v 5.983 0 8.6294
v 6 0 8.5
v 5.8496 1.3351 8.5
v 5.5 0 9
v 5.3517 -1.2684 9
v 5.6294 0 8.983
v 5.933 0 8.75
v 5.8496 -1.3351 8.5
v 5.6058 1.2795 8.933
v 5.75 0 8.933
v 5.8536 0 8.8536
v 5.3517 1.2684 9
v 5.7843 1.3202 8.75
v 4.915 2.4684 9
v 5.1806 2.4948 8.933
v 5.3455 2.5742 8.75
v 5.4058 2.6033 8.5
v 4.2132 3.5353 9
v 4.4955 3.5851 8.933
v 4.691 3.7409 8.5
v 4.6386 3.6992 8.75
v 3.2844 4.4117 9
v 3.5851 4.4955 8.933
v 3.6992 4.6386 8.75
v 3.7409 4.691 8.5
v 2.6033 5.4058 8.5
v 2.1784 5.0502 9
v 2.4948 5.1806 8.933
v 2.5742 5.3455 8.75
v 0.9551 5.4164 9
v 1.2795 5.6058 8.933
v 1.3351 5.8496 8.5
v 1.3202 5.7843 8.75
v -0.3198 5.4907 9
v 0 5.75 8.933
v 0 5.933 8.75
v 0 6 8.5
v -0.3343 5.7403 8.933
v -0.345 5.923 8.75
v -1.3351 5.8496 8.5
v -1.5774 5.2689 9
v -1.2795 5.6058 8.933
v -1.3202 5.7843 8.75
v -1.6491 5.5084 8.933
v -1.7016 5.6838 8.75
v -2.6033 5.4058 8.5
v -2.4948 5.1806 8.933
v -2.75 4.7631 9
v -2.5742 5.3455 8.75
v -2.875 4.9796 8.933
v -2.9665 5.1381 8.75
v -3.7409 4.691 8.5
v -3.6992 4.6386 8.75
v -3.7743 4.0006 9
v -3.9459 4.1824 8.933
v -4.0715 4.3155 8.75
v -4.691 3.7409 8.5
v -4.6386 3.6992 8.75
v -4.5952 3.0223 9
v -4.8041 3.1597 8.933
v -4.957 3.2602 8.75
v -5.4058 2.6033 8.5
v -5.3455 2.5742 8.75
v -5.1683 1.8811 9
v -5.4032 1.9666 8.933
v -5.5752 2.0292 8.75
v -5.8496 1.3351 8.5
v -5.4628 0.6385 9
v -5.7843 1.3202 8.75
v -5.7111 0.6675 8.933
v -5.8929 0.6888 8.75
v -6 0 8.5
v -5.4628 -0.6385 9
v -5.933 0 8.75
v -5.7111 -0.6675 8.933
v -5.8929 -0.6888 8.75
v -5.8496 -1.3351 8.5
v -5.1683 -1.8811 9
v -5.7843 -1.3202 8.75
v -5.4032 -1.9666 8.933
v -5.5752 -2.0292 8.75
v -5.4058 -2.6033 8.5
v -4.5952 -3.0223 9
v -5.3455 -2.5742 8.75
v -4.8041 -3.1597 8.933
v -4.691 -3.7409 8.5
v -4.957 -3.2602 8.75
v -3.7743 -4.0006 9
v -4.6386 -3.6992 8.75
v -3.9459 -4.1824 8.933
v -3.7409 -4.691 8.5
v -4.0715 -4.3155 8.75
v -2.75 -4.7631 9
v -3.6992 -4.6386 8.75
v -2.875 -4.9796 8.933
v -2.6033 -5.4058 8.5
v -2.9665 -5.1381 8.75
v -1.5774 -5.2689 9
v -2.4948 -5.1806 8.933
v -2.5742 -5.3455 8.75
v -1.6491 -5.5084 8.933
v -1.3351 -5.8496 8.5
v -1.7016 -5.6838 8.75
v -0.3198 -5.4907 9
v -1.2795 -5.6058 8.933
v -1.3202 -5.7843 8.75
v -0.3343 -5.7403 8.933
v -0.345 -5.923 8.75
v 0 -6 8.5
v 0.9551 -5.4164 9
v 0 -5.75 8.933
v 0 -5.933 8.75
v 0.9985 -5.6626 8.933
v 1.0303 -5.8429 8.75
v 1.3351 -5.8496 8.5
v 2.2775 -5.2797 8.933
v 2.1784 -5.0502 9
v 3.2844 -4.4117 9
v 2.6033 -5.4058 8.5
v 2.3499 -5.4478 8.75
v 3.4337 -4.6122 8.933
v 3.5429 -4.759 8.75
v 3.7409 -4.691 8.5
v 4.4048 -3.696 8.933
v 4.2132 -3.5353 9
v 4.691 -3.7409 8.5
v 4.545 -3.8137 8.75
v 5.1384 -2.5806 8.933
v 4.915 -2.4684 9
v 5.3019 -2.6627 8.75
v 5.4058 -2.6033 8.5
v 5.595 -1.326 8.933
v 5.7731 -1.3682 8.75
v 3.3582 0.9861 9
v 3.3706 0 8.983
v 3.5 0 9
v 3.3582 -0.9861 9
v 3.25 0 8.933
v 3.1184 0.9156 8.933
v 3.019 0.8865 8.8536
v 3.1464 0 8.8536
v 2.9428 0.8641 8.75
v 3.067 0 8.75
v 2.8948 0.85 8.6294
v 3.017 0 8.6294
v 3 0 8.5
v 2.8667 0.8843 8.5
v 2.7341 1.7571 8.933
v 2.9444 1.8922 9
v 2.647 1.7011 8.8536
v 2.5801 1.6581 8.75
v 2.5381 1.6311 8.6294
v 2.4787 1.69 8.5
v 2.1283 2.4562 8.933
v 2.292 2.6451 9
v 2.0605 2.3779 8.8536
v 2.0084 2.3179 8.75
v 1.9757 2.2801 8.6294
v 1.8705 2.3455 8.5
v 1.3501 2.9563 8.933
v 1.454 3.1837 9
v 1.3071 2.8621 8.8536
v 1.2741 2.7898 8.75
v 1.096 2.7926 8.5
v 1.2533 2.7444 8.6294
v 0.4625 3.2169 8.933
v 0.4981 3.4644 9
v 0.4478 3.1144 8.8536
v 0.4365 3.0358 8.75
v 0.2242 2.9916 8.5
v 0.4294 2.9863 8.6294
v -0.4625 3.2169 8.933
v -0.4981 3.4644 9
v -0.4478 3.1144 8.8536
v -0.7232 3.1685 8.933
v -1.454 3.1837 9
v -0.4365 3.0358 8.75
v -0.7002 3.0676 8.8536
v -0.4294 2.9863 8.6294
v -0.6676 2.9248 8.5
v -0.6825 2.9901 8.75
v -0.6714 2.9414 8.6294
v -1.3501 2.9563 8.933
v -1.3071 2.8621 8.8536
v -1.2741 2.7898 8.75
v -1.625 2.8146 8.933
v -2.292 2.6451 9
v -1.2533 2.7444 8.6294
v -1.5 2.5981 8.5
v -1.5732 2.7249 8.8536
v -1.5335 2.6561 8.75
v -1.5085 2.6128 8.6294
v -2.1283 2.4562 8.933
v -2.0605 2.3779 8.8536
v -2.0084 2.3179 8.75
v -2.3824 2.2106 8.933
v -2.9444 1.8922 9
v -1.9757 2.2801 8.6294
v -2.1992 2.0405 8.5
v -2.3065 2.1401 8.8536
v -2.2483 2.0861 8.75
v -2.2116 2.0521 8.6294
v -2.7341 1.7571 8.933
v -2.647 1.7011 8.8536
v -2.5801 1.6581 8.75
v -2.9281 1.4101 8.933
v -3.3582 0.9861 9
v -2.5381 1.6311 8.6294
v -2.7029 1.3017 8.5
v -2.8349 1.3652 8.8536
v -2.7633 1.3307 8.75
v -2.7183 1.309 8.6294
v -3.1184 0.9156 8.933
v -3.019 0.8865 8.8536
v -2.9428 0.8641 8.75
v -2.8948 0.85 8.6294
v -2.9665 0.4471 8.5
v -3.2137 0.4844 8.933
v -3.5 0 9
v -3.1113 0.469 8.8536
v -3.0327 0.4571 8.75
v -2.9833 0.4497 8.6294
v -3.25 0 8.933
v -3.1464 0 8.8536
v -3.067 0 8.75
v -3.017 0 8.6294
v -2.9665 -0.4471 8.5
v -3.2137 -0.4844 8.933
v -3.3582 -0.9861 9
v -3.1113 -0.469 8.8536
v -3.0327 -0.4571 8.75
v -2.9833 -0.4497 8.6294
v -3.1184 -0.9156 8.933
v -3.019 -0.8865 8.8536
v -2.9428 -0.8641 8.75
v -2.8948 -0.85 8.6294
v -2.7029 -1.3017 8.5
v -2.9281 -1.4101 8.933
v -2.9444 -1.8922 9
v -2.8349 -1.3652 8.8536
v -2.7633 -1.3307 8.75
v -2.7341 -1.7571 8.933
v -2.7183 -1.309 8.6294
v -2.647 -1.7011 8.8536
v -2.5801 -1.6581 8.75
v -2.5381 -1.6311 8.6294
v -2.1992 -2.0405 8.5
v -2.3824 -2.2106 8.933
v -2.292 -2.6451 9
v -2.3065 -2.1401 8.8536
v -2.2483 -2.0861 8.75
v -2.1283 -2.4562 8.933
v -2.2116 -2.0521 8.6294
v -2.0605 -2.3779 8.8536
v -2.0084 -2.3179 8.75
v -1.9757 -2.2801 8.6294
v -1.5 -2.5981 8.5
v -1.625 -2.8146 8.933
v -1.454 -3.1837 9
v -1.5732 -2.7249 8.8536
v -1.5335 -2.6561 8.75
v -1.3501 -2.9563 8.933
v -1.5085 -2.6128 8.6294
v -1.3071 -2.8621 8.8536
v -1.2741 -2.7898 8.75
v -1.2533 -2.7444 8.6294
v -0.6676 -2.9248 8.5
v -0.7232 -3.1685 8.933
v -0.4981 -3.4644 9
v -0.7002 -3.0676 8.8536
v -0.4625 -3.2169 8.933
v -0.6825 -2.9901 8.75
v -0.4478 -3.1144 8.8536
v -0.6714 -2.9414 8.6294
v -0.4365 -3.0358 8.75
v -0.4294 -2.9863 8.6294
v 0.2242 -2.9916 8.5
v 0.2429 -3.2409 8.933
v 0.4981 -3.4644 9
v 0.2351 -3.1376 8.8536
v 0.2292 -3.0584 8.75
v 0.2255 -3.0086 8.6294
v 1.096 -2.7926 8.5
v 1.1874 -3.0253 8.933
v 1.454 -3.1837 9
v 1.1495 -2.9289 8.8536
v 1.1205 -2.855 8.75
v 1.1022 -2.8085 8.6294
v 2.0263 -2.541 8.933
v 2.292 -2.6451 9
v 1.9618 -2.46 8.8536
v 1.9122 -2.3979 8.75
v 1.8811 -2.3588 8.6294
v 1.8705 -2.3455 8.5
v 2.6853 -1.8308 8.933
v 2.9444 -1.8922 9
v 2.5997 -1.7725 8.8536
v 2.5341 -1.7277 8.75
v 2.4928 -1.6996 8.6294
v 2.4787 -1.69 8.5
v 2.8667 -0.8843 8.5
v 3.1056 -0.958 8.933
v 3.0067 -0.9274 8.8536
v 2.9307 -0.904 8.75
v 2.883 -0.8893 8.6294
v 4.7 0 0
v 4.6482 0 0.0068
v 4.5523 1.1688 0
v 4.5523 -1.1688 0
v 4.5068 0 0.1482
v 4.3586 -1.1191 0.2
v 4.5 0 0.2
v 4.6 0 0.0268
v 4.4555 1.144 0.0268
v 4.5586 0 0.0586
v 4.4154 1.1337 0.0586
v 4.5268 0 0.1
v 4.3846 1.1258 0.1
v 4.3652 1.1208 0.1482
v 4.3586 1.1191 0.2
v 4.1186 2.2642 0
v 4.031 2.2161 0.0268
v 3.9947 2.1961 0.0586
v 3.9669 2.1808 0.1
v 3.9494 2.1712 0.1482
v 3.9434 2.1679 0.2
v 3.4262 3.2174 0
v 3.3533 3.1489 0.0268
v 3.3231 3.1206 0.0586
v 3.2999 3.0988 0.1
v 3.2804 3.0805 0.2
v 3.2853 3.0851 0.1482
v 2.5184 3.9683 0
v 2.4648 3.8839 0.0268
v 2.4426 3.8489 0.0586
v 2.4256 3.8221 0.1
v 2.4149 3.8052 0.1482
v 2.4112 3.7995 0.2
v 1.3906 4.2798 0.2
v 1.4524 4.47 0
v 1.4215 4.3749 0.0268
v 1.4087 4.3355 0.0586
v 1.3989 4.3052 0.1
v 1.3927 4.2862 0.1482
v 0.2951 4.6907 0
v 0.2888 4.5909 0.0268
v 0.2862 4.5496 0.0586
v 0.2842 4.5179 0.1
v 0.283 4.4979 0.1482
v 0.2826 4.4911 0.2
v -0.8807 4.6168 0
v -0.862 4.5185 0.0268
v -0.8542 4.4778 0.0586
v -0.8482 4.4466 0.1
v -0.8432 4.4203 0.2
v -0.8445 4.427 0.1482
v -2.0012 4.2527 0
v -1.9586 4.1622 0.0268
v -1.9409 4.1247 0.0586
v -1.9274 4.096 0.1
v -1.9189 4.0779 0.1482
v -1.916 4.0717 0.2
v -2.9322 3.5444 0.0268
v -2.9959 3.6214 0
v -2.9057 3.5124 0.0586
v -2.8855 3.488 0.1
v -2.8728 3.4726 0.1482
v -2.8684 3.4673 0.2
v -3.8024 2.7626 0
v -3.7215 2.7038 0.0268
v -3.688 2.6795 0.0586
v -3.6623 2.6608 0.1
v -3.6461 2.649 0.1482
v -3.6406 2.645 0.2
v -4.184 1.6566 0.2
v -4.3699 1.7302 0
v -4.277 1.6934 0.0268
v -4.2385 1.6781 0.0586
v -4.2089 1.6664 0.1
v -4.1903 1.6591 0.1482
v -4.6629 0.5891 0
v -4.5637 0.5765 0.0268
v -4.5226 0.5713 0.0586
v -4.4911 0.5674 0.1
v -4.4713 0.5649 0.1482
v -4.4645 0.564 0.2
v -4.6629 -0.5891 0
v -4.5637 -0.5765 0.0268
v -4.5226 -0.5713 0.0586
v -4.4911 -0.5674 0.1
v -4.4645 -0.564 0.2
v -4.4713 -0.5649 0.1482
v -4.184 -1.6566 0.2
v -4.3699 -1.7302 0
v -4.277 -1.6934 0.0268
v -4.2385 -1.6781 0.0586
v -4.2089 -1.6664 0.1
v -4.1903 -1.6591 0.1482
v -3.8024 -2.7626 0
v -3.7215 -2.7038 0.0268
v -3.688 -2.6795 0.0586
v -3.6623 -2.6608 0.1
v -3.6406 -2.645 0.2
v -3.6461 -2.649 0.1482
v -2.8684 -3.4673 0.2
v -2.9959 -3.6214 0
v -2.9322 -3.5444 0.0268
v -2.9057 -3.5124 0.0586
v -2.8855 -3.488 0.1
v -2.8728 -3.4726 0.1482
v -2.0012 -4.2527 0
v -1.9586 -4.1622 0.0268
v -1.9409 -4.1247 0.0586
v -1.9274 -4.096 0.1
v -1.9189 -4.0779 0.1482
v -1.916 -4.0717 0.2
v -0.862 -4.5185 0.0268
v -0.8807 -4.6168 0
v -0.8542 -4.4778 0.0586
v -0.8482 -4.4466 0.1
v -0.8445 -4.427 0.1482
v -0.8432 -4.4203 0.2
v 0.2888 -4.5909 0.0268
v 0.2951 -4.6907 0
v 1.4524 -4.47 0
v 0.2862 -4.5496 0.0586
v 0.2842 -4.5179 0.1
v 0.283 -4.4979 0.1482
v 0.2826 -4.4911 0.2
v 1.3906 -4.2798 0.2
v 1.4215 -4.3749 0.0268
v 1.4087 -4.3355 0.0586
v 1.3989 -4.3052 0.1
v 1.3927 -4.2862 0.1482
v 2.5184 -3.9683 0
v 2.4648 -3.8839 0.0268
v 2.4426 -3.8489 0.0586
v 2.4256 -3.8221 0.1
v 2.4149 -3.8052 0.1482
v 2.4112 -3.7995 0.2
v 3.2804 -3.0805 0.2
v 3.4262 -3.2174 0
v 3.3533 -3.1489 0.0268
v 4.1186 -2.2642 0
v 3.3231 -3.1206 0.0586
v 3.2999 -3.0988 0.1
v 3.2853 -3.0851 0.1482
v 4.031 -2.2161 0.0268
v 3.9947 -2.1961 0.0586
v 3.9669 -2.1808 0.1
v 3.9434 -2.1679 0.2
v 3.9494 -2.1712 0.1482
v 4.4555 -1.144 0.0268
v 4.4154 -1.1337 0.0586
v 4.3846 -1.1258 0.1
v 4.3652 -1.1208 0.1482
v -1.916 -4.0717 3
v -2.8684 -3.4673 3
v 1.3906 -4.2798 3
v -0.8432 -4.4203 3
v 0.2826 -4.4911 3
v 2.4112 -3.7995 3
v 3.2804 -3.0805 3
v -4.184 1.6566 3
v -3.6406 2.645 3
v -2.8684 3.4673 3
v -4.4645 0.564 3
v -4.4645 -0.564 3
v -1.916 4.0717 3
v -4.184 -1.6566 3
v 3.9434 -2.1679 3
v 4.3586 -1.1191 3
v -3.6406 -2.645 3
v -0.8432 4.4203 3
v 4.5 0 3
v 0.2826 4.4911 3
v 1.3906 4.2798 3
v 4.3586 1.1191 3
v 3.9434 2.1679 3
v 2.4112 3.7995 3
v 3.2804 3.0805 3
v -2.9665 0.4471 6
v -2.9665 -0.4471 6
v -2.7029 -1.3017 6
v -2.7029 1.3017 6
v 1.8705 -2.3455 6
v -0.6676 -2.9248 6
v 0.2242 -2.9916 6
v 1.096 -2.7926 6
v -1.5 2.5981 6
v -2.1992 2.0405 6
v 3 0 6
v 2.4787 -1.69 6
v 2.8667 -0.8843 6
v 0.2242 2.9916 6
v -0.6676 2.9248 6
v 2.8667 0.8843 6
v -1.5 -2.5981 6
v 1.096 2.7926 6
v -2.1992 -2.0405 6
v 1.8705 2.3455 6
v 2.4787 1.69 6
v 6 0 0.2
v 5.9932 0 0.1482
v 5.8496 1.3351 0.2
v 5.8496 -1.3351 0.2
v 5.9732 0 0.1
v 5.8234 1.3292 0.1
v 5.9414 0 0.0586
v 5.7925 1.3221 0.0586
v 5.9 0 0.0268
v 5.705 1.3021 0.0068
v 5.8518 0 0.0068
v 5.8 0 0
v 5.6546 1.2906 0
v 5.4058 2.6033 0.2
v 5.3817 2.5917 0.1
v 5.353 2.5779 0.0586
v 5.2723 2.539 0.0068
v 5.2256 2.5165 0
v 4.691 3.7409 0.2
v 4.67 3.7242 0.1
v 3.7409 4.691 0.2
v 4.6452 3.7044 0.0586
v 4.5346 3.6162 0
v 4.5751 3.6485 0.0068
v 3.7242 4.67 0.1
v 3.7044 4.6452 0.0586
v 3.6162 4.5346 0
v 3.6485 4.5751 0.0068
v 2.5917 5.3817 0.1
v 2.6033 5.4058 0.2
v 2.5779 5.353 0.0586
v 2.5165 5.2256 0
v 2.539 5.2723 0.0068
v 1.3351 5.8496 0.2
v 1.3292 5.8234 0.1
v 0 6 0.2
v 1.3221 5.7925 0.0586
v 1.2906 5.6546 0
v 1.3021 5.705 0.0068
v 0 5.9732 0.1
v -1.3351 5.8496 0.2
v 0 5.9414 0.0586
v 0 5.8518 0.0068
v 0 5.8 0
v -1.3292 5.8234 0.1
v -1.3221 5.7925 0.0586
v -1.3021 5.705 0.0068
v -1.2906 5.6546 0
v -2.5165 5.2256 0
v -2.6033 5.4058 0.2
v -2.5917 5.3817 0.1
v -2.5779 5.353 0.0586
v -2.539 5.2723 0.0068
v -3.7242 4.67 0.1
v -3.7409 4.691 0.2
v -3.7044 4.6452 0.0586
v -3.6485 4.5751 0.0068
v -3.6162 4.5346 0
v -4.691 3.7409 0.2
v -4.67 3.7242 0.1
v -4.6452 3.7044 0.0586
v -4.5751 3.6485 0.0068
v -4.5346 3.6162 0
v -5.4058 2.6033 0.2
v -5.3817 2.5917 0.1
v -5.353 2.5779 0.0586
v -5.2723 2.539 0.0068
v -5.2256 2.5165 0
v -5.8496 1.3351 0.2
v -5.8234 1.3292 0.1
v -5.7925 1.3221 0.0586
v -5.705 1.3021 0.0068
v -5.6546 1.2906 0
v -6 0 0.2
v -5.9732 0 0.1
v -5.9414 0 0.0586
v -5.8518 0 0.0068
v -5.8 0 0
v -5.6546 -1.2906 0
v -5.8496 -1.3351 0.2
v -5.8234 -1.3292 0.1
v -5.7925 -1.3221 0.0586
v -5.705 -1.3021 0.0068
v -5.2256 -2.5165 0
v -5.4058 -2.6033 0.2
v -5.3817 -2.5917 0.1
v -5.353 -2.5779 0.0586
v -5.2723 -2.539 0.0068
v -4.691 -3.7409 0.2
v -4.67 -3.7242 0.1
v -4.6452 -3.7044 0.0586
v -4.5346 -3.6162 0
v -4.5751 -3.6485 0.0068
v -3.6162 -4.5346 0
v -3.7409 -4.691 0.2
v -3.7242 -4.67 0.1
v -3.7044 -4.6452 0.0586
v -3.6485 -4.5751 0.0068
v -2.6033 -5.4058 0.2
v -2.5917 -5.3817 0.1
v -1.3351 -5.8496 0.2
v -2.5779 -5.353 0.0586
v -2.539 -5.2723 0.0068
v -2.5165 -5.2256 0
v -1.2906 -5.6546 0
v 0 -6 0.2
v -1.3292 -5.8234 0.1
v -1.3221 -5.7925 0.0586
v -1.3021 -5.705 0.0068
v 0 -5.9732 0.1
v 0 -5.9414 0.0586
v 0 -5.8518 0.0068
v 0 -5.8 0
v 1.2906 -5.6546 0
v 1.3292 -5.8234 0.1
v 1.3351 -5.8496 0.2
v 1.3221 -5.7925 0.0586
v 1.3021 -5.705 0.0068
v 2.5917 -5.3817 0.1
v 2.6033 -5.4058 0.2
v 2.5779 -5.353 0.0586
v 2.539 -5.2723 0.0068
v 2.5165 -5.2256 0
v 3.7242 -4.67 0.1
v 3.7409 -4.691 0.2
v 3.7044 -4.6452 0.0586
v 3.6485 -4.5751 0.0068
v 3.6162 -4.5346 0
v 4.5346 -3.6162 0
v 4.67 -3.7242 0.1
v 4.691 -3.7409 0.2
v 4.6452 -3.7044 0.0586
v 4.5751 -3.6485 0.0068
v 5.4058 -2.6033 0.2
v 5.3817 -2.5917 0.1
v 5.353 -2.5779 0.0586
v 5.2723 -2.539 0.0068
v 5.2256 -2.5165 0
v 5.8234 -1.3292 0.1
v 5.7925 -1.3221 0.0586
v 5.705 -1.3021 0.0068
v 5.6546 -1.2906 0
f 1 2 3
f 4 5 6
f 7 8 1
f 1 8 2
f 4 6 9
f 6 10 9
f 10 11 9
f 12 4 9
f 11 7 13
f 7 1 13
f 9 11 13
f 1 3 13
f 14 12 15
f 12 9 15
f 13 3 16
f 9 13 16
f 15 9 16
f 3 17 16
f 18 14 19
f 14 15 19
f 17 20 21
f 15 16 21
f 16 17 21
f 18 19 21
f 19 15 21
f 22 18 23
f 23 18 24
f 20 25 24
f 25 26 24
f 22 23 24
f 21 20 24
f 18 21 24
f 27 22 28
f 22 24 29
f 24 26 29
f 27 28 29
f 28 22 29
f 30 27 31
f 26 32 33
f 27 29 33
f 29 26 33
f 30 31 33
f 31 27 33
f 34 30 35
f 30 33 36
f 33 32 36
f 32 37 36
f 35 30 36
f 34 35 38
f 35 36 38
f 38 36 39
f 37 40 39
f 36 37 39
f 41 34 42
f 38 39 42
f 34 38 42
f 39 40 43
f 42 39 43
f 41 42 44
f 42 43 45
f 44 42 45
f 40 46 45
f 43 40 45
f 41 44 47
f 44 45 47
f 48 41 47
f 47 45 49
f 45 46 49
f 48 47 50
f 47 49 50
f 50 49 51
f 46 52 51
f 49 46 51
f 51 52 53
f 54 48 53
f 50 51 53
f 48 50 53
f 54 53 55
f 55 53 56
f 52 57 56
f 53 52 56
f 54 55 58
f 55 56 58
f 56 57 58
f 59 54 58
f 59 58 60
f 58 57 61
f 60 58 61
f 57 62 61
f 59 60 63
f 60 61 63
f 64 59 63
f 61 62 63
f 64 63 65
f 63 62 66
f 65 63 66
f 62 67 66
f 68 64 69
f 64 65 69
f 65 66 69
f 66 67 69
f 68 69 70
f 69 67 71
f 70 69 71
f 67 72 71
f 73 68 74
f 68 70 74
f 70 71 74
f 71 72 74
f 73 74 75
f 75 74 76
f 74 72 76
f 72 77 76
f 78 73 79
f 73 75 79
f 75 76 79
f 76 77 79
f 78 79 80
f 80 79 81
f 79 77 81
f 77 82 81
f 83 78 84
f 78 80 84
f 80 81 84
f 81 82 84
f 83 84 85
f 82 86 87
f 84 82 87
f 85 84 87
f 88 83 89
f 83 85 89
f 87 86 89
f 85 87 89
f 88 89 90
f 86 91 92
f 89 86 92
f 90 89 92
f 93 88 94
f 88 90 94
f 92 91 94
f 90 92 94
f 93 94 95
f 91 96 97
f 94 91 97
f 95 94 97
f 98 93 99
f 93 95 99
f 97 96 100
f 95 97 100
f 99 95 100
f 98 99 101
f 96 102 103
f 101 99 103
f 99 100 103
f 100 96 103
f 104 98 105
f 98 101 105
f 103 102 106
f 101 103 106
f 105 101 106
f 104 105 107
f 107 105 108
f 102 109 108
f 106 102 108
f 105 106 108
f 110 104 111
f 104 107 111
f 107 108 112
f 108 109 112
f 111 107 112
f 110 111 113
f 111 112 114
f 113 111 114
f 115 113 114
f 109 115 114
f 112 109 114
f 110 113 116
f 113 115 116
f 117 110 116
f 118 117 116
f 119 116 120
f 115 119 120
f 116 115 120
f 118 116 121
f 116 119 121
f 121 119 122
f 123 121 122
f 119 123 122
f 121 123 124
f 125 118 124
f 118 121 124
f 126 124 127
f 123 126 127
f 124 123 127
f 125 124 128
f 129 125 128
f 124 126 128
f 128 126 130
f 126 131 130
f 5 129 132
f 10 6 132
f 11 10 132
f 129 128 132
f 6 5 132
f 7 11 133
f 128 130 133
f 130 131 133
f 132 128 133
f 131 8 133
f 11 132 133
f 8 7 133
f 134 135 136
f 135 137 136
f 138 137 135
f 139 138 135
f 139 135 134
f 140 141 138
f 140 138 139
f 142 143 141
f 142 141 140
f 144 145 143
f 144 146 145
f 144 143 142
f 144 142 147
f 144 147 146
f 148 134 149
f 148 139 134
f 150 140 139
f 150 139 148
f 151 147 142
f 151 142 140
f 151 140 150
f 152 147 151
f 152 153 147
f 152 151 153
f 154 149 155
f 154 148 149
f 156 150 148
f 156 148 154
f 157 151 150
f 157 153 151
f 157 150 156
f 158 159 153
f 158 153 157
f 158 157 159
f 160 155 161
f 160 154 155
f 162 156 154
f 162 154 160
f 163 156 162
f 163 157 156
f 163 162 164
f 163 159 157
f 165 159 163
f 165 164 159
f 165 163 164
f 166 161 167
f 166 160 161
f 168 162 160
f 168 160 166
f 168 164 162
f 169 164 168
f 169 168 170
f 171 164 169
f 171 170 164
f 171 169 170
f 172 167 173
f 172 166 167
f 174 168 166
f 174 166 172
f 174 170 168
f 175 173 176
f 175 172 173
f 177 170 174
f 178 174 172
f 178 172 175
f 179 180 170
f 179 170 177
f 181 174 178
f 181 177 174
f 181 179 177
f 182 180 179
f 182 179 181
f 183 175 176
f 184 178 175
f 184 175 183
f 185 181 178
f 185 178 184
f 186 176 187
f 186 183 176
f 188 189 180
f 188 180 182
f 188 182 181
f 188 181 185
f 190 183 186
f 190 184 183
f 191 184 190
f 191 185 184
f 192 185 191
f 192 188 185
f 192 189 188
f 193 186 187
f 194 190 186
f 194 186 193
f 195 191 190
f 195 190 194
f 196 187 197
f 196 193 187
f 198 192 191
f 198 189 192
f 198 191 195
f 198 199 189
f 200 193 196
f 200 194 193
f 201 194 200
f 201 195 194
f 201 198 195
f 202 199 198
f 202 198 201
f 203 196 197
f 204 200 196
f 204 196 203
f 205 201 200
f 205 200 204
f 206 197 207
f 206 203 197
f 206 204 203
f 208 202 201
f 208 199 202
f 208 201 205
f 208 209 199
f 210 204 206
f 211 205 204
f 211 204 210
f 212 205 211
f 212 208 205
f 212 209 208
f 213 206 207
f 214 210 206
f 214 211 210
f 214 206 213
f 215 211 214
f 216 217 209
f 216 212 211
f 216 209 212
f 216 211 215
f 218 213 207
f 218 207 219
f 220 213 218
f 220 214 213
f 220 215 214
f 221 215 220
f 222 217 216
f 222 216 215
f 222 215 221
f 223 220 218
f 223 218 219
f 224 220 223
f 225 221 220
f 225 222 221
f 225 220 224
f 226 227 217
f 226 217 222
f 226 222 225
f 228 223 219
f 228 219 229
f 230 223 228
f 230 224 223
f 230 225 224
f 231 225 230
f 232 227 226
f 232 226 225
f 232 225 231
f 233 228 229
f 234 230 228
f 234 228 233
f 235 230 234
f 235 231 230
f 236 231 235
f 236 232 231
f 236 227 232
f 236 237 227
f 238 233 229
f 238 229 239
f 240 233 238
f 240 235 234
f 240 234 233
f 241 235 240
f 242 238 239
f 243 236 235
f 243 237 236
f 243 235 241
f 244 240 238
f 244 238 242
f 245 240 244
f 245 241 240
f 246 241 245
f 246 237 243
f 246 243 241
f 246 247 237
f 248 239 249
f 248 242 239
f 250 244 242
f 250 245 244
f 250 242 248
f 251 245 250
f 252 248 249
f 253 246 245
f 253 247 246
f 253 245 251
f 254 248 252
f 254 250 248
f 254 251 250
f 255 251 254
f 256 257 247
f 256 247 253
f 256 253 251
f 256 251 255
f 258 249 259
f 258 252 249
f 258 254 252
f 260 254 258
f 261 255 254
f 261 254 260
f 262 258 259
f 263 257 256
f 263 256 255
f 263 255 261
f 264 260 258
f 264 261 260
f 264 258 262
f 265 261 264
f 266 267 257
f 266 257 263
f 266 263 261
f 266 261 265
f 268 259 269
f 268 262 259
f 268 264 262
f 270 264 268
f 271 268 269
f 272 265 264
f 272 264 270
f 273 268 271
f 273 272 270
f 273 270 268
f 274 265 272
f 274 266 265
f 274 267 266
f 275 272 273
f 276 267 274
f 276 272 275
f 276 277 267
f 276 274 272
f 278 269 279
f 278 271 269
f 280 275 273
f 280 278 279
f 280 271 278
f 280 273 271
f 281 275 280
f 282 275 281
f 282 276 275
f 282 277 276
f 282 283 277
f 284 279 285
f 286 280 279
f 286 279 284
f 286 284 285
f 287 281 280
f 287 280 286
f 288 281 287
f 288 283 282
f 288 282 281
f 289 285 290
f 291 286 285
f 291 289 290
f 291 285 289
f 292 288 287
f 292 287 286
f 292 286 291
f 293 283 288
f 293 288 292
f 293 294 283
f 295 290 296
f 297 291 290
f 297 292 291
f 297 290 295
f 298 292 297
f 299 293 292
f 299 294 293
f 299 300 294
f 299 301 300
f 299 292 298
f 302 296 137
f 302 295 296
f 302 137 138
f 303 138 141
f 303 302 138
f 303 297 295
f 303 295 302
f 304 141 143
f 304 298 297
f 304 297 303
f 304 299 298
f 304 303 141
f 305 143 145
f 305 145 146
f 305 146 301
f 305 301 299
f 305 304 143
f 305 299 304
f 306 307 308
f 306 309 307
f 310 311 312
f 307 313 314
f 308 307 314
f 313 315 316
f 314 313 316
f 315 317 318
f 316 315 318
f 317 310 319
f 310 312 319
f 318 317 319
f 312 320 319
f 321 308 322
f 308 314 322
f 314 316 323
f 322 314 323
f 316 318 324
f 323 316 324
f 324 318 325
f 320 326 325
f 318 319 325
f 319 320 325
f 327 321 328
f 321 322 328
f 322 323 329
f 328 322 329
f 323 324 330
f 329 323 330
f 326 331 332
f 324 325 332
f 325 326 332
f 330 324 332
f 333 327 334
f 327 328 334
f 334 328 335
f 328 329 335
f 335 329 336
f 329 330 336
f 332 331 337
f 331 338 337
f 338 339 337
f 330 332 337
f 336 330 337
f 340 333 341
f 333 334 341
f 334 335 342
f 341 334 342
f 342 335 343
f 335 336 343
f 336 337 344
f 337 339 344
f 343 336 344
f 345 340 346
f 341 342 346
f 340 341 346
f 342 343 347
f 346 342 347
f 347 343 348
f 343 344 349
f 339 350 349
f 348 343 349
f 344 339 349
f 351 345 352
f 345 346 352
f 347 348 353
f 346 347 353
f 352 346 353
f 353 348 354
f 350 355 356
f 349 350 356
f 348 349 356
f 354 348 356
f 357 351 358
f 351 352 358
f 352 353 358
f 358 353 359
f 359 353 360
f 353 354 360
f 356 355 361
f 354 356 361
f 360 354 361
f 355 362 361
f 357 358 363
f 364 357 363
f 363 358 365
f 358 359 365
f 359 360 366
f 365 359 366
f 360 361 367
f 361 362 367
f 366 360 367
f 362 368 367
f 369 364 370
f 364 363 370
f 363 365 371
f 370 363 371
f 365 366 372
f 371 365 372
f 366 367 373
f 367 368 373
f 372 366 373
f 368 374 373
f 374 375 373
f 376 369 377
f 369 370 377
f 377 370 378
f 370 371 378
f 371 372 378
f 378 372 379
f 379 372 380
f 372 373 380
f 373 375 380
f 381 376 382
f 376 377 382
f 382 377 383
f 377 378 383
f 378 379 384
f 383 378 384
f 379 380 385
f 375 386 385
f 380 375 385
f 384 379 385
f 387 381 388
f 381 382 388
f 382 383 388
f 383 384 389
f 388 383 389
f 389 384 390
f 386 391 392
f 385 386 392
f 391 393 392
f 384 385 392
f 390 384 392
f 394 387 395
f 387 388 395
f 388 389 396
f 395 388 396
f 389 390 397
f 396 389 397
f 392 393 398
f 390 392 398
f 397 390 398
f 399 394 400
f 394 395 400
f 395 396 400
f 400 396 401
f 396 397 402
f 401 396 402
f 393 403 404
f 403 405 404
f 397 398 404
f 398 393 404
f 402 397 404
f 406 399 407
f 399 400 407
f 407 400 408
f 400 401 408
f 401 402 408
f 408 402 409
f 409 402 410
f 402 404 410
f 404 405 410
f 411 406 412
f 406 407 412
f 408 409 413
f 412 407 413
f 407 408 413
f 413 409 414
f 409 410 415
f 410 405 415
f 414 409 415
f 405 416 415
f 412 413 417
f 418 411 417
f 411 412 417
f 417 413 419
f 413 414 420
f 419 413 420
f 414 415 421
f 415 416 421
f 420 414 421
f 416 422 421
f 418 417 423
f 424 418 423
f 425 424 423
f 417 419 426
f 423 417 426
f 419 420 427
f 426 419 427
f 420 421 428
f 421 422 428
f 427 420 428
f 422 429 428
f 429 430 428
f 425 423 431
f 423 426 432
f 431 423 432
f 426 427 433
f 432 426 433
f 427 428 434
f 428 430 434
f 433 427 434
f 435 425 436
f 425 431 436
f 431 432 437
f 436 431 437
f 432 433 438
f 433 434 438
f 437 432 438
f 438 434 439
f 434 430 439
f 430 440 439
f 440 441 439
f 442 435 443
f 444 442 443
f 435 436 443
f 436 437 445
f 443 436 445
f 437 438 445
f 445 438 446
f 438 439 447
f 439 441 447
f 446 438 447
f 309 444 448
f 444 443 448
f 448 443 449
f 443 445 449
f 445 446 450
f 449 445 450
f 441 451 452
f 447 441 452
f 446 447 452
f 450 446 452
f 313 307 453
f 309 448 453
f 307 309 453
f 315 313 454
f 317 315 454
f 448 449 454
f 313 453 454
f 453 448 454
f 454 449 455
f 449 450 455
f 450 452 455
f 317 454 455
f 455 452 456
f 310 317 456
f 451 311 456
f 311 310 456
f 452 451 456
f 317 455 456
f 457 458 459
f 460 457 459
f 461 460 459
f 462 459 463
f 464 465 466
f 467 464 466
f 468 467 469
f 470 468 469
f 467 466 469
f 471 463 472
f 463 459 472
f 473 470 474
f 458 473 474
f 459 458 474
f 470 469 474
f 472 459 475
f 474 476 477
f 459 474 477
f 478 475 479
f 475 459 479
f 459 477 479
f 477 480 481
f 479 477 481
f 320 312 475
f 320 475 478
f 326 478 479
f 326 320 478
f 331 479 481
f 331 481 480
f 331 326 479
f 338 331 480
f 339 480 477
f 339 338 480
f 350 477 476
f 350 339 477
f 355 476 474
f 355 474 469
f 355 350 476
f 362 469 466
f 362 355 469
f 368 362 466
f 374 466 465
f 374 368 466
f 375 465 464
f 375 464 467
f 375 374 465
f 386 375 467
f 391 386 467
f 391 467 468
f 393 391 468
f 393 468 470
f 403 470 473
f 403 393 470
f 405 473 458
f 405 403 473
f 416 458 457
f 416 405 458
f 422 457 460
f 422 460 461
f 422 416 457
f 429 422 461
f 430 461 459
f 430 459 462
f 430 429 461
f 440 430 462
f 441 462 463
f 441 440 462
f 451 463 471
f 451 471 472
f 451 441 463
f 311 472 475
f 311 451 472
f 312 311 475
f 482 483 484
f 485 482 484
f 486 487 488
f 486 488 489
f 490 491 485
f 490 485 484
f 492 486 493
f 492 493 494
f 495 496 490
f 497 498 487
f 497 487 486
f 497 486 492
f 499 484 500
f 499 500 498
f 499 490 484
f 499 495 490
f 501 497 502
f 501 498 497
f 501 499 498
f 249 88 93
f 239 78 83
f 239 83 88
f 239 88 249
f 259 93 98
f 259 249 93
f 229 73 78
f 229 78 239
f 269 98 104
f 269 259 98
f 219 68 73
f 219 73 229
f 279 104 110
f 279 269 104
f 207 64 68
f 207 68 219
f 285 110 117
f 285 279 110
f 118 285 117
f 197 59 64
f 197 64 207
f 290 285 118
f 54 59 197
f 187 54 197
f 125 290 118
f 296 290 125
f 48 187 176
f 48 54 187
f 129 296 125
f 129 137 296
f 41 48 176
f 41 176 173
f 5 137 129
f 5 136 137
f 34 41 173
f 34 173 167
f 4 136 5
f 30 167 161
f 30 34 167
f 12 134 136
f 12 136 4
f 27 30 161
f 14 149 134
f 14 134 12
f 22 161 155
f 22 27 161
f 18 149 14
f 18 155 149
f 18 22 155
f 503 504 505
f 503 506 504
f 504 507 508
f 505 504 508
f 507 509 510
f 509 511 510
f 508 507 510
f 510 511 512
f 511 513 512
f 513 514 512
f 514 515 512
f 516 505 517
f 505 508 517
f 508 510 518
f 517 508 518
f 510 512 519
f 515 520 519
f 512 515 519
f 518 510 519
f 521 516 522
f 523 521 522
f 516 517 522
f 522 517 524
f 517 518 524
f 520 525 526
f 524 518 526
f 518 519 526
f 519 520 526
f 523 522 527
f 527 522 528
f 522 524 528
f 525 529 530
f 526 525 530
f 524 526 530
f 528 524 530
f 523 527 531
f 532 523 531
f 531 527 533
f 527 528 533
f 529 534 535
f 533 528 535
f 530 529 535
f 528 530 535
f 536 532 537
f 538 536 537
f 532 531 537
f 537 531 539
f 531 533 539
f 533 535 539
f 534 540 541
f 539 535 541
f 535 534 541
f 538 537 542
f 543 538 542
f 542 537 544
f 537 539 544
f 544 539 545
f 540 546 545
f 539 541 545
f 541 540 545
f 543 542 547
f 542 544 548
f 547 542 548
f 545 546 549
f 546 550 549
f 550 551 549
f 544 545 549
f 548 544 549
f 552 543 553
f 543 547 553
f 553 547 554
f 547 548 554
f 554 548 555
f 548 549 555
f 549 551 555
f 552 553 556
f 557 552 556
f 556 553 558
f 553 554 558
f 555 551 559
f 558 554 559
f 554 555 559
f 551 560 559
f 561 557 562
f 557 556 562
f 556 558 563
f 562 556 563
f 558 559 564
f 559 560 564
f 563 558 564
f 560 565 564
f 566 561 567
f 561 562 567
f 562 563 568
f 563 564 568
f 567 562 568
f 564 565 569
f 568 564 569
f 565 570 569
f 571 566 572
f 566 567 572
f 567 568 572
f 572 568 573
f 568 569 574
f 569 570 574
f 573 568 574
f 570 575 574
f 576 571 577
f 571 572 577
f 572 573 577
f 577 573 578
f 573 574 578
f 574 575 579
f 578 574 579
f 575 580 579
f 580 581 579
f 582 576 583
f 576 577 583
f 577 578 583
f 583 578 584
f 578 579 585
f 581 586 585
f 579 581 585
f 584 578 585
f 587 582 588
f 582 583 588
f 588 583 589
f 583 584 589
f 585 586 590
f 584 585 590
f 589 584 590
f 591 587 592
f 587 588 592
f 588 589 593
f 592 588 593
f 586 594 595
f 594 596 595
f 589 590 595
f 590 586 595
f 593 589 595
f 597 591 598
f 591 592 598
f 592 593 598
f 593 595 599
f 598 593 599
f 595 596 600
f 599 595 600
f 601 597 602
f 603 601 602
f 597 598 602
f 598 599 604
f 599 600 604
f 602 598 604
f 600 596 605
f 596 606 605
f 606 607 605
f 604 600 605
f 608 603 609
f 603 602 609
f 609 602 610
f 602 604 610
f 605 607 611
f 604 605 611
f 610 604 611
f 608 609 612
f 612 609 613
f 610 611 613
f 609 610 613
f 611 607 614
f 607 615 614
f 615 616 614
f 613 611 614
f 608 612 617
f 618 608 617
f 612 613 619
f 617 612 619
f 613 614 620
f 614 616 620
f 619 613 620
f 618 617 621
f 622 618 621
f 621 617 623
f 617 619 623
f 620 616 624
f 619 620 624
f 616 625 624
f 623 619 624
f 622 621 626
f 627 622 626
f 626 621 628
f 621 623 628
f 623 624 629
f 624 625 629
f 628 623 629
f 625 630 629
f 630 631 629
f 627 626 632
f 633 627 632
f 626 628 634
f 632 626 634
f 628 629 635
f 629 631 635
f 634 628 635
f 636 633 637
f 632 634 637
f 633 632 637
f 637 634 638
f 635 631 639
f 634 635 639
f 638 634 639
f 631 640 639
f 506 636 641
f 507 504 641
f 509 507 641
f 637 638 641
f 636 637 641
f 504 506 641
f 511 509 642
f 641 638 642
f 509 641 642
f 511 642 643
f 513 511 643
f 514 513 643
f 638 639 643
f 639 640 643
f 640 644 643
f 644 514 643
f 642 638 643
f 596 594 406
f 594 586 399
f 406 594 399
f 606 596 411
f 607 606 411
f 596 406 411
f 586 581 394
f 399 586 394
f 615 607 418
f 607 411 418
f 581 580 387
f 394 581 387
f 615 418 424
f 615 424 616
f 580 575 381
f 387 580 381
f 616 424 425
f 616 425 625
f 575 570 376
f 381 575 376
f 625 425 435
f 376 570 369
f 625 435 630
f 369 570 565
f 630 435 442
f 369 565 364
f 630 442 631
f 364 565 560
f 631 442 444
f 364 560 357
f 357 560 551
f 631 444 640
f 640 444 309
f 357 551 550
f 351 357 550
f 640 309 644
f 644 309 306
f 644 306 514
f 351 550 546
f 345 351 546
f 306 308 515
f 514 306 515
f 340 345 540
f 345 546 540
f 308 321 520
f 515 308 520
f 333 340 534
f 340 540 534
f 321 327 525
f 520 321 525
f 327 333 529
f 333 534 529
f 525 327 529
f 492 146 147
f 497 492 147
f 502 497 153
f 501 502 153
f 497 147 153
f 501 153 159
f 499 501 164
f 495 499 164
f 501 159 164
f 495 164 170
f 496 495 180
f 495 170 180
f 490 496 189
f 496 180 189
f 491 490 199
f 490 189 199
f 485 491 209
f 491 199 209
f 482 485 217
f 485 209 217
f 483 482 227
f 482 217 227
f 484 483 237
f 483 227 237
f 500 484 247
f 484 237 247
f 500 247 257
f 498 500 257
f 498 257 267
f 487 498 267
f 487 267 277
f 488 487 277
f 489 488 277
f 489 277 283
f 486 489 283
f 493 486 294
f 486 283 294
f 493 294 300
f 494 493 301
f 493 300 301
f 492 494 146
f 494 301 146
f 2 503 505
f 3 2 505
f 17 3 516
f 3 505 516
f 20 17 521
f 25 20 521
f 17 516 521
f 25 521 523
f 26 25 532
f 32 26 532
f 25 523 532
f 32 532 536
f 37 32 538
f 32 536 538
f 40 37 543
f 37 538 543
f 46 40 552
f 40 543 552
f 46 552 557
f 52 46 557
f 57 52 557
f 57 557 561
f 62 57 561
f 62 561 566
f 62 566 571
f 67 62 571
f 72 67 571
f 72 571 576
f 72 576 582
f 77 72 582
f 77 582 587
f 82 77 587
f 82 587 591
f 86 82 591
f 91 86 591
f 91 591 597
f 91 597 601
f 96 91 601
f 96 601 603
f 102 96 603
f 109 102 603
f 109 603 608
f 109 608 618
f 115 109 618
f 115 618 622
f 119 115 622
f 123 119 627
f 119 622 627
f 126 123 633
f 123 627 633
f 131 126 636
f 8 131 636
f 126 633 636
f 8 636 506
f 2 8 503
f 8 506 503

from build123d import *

# Parameters (mm, degrees)
SKETCH_1_R          = 6
SKETCH_1_R_2        = 4.5
EXTRUDE_1_DEPTH     = 3
SKETCH_2_R          = 6
EXTRUDE_2_DEPTH     = 6
SKETCH_3_R          = 3
CUT_EXTRUDE_1_DEPTH = 3
FILLET_1_R          = 0.5
FILLET_2_R          = 0.5
FILLET_3_R          = 0.2


with BuildPart() as part:
    # 草图1 → 凸台-拉伸1 (new body)
    with BuildSketch(Plane.XY):
        Circle(SKETCH_1_R)
        Circle(SKETCH_1_R_2, mode=Mode.SUBTRACT)
    extrude(amount=EXTRUDE_1_DEPTH)

    # 草图2 → 凸台-拉伸2 (add)
    with BuildSketch(Plane.XY.offset(3)):
        Circle(SKETCH_2_R)
    extrude(amount=EXTRUDE_2_DEPTH)

    # 草图3 → 切除-拉伸1 (cut)
    with BuildSketch(Plane.XY.offset(9)):
        Circle(SKETCH_3_R)
    extrude(amount=-CUT_EXTRUDE_1_DEPTH, mode=Mode.SUBTRACT)

    # 圆角1
    fillet_1_edges = [part.edges().sort_by_distance(p)[0] for p in [
        (-3, 0, 9),
    ]]
    fillet(fillet_1_edges, radius=FILLET_1_R)

    # 圆角2
    fillet_2_edges = [part.edges().sort_by_distance(p)[0] for p in [
        (-6, 0, 9),
    ]]
    fillet(fillet_2_edges, radius=FILLET_2_R)

    # 圆角3
    fillet_3_edges = [part.edges().sort_by_distance(p)[0] for p in [
        (-6, 0, 0),
        (-4.5, 0, 0),
    ]]
    fillet(fillet_3_edges, radius=FILLET_3_R)


solid = part.part
